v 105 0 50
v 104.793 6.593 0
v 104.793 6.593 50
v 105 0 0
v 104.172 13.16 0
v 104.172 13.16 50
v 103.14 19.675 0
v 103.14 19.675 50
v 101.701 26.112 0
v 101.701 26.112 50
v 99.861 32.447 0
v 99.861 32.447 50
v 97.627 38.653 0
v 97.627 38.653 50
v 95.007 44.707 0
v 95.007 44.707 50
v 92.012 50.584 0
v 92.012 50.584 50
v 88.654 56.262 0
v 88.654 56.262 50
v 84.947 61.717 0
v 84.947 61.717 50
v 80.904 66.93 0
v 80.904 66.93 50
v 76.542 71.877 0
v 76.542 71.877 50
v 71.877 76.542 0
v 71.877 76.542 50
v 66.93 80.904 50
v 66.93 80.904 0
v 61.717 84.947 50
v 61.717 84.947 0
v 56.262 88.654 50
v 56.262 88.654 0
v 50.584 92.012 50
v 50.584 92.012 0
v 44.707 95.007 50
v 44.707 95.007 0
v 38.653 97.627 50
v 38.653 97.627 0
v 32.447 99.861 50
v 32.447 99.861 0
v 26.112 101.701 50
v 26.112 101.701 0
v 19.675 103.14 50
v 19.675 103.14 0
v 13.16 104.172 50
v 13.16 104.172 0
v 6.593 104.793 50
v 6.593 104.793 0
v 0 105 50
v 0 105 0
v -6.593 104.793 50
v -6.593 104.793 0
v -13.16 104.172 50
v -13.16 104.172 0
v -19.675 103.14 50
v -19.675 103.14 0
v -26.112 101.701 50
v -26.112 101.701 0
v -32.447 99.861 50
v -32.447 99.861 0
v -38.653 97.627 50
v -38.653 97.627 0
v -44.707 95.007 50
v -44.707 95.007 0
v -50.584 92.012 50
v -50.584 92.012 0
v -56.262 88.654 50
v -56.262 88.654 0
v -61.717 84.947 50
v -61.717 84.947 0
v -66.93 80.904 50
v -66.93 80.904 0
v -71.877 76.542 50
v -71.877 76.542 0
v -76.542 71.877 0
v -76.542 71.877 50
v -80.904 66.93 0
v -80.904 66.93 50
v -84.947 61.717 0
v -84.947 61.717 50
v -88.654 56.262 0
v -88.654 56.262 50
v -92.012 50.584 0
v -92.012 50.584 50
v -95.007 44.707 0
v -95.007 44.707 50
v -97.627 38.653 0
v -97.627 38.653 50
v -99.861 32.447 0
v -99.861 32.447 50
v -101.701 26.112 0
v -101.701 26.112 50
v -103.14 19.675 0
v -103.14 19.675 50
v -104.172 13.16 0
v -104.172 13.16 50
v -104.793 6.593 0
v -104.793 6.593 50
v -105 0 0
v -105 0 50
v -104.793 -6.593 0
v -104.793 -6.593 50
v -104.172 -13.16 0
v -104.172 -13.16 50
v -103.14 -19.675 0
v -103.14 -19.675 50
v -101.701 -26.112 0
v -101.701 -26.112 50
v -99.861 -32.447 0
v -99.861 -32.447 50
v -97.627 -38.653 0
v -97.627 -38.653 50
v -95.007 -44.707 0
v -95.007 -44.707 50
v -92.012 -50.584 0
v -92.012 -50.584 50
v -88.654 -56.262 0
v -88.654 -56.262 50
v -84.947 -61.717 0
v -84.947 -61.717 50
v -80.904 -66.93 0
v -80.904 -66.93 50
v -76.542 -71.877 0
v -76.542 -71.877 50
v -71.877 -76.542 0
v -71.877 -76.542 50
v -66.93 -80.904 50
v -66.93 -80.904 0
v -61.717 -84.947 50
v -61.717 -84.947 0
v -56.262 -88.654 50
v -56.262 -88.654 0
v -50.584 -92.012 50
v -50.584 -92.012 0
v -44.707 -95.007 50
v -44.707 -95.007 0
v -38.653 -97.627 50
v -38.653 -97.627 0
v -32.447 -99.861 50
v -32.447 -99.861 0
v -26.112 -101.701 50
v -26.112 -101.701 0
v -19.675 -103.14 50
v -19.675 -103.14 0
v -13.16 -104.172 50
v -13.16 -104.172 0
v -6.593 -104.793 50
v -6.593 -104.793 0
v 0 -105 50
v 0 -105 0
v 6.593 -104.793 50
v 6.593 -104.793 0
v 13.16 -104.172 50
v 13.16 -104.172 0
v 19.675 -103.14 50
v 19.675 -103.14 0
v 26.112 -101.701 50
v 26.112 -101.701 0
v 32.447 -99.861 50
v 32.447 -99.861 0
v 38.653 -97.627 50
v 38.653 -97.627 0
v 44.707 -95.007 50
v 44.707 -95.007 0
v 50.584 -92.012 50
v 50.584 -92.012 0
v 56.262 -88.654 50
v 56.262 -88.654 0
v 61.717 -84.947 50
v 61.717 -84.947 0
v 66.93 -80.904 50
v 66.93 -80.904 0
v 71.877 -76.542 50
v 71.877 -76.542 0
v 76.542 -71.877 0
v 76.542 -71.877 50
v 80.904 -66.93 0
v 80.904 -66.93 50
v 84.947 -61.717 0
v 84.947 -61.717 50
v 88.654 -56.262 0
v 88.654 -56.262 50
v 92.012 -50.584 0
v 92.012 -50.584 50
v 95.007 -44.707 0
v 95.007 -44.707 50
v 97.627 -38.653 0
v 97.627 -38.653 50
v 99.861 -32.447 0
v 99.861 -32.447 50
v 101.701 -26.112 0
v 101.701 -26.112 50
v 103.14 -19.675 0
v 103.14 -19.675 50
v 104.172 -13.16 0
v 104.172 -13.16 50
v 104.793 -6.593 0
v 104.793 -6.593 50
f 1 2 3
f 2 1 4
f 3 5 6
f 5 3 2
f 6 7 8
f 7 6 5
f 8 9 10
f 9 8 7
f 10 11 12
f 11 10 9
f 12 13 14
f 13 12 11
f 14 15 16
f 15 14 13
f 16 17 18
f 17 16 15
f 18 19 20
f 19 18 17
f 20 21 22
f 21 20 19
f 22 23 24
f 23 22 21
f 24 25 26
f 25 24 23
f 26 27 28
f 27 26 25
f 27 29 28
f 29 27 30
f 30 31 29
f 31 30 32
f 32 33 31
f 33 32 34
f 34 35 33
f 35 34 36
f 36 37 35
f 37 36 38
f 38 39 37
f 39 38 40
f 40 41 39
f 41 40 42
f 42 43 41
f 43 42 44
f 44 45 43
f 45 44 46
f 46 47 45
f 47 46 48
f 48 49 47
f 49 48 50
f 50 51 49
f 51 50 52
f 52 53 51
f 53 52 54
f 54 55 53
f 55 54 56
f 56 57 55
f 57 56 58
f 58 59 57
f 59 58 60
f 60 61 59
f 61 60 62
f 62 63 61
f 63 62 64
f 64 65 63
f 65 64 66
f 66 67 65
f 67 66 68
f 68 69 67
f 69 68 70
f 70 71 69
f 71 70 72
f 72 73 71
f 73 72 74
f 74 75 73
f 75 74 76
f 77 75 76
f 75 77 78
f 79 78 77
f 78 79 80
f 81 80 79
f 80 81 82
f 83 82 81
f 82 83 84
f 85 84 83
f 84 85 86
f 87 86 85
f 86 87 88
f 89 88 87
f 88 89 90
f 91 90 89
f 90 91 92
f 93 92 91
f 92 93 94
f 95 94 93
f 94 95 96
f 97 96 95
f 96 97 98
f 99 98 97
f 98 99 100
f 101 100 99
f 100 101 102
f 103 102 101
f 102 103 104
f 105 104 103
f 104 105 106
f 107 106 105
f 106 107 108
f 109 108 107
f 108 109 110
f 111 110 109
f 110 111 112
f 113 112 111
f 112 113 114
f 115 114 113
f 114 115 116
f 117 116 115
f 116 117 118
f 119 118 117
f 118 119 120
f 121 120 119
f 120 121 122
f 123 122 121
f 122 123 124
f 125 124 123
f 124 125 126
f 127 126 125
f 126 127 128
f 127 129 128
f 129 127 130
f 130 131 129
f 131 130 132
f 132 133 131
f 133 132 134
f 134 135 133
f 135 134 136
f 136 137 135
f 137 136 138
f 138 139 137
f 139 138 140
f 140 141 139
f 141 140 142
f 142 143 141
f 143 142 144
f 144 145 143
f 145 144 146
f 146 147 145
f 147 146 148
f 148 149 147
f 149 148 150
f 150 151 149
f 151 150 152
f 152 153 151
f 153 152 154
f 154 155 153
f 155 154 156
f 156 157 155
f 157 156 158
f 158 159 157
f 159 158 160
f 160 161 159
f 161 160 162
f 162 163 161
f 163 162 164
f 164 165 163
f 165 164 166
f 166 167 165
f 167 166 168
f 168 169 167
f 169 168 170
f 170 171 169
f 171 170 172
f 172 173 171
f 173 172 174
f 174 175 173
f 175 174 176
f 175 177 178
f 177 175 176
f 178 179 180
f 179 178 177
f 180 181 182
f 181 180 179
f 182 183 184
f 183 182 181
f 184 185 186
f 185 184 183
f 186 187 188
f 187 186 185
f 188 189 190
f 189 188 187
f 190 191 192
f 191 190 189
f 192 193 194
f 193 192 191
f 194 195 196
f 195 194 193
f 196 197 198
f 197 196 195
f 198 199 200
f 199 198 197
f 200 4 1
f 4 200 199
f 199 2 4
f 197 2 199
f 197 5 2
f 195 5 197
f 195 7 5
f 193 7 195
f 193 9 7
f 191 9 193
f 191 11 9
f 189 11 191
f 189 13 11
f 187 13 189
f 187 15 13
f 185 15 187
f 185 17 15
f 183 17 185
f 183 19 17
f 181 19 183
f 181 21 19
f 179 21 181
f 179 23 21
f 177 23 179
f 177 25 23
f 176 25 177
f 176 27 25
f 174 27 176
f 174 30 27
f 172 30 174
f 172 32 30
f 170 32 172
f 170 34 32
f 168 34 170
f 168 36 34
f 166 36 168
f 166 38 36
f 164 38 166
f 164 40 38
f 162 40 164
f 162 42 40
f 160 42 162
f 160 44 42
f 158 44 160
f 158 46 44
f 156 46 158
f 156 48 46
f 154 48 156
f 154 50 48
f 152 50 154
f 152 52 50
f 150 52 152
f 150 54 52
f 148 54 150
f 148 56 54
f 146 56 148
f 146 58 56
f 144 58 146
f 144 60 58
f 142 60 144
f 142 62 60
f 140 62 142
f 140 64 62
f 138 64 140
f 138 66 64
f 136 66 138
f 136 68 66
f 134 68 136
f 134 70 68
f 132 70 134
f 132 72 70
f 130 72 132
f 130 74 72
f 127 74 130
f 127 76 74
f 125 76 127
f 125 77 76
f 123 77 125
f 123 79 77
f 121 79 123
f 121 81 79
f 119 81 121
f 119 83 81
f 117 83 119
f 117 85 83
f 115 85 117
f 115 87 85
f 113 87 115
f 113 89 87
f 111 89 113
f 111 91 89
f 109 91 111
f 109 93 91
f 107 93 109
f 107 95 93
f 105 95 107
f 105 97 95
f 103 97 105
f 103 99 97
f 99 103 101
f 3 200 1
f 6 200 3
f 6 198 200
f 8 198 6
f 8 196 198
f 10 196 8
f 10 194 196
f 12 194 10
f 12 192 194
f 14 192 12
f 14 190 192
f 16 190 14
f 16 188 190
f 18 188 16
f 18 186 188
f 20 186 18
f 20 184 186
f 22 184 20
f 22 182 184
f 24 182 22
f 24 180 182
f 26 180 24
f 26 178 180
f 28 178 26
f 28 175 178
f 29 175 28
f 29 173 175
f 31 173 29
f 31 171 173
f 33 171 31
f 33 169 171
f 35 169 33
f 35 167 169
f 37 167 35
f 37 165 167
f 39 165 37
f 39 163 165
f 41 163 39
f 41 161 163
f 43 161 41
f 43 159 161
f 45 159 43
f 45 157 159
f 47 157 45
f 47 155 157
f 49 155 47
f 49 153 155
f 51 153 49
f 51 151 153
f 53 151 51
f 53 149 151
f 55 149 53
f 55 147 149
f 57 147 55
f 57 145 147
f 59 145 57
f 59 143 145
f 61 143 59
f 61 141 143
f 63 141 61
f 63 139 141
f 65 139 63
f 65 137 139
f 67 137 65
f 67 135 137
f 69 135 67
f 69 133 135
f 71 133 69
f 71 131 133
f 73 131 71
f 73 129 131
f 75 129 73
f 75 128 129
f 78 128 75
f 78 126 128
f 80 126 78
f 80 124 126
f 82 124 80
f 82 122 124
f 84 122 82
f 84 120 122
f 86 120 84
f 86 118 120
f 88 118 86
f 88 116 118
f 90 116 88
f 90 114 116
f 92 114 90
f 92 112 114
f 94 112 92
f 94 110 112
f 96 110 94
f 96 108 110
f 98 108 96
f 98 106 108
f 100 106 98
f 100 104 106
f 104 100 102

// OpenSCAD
        // Housing (placeholder)
        $fn = 100;
        module housing() {
            cylinder(h=50, d=210);
        }
        housing();
        
